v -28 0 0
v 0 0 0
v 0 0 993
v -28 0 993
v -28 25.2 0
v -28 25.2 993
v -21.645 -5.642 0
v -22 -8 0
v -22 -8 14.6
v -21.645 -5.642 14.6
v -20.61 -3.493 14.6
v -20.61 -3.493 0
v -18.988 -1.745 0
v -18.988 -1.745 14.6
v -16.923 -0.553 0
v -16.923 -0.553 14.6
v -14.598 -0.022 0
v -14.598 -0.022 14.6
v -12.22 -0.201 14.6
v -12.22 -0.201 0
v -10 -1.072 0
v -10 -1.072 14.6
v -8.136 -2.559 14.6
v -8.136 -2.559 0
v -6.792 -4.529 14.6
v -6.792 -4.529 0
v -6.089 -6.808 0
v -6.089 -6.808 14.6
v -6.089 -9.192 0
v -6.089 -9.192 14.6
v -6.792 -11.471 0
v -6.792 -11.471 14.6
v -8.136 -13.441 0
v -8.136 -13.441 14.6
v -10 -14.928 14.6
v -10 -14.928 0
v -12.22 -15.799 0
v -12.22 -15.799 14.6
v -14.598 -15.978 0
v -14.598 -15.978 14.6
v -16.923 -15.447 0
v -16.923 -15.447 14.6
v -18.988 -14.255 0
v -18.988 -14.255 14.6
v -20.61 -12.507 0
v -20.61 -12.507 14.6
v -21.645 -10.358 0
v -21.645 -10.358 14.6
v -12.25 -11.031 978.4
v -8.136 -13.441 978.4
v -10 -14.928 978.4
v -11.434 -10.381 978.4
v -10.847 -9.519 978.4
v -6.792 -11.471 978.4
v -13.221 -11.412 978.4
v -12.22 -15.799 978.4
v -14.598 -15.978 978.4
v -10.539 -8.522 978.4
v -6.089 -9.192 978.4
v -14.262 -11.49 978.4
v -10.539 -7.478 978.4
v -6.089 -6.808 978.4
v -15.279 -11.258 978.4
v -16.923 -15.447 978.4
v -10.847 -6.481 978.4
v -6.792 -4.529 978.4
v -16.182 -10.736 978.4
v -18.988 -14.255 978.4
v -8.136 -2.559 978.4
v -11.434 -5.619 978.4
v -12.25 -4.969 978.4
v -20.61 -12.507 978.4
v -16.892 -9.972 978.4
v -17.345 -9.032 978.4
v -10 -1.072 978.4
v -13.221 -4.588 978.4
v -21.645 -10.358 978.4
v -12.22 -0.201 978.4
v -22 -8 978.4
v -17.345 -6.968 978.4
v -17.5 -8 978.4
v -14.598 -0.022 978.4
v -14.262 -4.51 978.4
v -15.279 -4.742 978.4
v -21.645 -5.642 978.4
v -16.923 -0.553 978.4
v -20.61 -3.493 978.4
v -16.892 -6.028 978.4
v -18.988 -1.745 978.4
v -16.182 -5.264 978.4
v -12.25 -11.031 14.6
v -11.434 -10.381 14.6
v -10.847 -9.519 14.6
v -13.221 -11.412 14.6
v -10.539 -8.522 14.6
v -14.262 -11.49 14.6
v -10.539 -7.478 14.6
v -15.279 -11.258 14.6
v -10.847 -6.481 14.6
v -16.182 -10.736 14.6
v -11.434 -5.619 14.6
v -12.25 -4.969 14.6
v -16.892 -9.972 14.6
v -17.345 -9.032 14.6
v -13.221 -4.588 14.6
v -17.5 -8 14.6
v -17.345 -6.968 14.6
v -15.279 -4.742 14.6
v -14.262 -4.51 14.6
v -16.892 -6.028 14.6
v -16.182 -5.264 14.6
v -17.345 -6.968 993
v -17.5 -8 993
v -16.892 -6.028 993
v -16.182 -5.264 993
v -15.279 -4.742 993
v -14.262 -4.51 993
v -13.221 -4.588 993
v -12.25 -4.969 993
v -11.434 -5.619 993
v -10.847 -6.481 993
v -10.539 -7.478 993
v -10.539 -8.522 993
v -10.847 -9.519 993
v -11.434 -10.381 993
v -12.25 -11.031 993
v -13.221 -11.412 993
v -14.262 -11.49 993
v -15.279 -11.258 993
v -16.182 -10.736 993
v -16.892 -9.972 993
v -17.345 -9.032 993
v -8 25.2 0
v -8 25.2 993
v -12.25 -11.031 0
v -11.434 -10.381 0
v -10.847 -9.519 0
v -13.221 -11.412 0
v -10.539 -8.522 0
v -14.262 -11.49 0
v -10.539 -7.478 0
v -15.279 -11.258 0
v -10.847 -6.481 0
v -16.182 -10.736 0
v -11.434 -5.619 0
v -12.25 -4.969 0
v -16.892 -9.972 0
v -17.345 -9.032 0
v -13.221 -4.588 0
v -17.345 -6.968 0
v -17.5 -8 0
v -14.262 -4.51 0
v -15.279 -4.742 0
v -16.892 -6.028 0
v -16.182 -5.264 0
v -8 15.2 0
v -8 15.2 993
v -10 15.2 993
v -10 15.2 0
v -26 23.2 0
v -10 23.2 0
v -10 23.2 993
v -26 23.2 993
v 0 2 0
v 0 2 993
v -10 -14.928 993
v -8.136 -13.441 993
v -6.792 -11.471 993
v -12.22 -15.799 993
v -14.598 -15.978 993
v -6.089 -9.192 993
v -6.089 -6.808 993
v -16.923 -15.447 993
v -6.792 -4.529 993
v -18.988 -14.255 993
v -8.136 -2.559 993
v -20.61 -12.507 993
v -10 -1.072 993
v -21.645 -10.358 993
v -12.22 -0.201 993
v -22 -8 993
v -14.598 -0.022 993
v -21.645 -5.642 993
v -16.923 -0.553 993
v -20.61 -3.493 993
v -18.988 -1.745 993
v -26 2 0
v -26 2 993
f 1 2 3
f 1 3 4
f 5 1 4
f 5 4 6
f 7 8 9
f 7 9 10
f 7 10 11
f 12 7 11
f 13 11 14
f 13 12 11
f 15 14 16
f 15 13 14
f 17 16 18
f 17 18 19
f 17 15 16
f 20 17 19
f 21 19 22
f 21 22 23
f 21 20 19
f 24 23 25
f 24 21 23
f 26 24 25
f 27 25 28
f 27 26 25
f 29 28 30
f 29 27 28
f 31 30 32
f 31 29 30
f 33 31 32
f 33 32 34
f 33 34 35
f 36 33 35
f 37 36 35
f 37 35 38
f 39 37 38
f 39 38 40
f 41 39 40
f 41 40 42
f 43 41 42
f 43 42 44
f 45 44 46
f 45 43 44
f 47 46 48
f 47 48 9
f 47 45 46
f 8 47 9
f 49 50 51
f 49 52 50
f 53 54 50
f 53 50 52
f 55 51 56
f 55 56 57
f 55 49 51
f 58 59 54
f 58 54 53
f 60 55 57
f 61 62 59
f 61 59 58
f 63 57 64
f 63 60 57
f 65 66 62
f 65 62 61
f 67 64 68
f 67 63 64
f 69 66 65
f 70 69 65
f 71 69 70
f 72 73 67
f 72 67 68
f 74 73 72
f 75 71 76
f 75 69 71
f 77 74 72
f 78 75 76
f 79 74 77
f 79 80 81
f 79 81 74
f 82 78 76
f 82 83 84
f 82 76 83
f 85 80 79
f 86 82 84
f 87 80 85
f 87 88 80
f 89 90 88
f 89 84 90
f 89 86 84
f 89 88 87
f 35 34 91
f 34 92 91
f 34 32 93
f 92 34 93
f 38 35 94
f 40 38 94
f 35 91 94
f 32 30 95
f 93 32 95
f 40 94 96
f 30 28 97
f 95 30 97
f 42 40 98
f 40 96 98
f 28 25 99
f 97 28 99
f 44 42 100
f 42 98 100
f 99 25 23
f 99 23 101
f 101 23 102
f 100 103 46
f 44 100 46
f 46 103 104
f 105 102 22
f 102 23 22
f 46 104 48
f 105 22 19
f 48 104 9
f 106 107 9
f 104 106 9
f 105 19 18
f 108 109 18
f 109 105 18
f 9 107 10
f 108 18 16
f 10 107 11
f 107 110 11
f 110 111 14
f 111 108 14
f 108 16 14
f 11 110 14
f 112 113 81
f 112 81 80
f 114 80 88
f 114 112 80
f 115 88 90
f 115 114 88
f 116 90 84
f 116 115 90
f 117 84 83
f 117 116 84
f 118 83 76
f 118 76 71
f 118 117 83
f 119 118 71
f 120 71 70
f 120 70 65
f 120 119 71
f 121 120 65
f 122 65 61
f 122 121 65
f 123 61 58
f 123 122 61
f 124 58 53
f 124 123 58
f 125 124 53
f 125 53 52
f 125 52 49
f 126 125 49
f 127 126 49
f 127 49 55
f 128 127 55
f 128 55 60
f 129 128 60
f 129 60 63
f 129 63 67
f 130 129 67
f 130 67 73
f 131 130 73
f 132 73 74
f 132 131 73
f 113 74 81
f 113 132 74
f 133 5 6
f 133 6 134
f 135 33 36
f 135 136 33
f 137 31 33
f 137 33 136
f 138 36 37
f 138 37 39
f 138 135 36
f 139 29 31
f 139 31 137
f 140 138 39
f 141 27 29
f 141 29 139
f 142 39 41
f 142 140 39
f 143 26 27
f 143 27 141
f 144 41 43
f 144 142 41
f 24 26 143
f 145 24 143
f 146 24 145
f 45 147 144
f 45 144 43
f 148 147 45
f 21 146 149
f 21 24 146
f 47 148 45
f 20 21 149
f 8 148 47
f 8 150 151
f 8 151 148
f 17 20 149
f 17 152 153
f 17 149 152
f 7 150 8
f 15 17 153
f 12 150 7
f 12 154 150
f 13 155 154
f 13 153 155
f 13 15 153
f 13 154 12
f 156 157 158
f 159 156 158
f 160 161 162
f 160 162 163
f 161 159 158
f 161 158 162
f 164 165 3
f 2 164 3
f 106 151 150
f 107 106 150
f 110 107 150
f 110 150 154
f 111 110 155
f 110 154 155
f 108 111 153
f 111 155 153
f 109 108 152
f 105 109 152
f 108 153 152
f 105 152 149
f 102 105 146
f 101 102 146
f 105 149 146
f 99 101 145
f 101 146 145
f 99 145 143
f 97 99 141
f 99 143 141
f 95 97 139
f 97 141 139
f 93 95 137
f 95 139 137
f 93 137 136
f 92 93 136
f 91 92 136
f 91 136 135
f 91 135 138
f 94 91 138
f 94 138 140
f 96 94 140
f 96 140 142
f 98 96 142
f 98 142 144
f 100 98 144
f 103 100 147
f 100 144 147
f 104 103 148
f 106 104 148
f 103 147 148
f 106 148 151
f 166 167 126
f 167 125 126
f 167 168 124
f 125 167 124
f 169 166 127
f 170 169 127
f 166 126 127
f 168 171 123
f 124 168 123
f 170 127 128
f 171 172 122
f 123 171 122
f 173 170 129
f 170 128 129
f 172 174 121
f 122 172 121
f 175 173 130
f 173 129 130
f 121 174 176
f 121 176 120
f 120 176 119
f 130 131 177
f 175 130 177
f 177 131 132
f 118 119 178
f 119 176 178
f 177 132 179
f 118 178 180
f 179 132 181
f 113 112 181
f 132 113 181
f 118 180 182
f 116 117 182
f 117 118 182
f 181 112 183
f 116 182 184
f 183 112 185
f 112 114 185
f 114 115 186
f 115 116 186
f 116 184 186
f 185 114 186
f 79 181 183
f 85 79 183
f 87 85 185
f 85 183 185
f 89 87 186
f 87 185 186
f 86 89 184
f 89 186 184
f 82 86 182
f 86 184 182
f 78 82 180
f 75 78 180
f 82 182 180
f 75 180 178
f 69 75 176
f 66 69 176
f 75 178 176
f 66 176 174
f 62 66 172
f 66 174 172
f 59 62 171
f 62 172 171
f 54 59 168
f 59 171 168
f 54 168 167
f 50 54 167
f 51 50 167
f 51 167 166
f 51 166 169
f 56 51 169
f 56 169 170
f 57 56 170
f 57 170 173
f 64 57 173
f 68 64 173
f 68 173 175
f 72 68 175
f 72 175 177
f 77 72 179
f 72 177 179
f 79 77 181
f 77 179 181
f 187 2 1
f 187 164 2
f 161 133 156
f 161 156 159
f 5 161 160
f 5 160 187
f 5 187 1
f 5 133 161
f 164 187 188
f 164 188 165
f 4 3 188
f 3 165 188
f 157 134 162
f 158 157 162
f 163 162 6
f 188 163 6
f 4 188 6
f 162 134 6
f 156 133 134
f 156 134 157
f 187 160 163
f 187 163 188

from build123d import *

# Parameters (mm, degrees)
BOSS_EXTRUDE1_DEPTH = 993
SKETCH2_R           = 8
SKETCH2_R_2         = 3.5
BOSS_EXTRUDE2_DEPTH = 14.6


with BuildPart() as part:
    # Sketch1 → Boss-Extrude1 (new body)
    with BuildSketch(Plane.XY):
        Polygon((0, 0), (-28, 0), (-28, 25.2), (-8, 25.2), (-8, 15.2), (-10, 15.2), (-10, 23.2), (-26, 23.2), (-26, 2), (0, 2), align=None)
    extrude(amount=BOSS_EXTRUDE1_DEPTH)


with BuildPart() as body_2:
    # Sketch2 → Boss-Extrude2 (new body)
    with BuildSketch(Plane(origin=(0, 0, 0), x_dir=(-1, 0, 0), z_dir=(0, 0, -1))):
        with Locations((14, -8)):
            Circle(SKETCH2_R)
        with Locations((14, -8)):
            Circle(SKETCH2_R_2, mode=Mode.SUBTRACT)
    extrude(amount=-BOSS_EXTRUDE2_DEPTH)


with BuildPart() as body_3:
    # Mirror10: mirrored copy
    add(body_2.part.mirror(Plane(origin=(0, 0, 496.5), x_dir=(1, 0, 0), z_dir=(0, 0, -1))))


solid = Compound([part.part, body_2.part, body_3.part])
